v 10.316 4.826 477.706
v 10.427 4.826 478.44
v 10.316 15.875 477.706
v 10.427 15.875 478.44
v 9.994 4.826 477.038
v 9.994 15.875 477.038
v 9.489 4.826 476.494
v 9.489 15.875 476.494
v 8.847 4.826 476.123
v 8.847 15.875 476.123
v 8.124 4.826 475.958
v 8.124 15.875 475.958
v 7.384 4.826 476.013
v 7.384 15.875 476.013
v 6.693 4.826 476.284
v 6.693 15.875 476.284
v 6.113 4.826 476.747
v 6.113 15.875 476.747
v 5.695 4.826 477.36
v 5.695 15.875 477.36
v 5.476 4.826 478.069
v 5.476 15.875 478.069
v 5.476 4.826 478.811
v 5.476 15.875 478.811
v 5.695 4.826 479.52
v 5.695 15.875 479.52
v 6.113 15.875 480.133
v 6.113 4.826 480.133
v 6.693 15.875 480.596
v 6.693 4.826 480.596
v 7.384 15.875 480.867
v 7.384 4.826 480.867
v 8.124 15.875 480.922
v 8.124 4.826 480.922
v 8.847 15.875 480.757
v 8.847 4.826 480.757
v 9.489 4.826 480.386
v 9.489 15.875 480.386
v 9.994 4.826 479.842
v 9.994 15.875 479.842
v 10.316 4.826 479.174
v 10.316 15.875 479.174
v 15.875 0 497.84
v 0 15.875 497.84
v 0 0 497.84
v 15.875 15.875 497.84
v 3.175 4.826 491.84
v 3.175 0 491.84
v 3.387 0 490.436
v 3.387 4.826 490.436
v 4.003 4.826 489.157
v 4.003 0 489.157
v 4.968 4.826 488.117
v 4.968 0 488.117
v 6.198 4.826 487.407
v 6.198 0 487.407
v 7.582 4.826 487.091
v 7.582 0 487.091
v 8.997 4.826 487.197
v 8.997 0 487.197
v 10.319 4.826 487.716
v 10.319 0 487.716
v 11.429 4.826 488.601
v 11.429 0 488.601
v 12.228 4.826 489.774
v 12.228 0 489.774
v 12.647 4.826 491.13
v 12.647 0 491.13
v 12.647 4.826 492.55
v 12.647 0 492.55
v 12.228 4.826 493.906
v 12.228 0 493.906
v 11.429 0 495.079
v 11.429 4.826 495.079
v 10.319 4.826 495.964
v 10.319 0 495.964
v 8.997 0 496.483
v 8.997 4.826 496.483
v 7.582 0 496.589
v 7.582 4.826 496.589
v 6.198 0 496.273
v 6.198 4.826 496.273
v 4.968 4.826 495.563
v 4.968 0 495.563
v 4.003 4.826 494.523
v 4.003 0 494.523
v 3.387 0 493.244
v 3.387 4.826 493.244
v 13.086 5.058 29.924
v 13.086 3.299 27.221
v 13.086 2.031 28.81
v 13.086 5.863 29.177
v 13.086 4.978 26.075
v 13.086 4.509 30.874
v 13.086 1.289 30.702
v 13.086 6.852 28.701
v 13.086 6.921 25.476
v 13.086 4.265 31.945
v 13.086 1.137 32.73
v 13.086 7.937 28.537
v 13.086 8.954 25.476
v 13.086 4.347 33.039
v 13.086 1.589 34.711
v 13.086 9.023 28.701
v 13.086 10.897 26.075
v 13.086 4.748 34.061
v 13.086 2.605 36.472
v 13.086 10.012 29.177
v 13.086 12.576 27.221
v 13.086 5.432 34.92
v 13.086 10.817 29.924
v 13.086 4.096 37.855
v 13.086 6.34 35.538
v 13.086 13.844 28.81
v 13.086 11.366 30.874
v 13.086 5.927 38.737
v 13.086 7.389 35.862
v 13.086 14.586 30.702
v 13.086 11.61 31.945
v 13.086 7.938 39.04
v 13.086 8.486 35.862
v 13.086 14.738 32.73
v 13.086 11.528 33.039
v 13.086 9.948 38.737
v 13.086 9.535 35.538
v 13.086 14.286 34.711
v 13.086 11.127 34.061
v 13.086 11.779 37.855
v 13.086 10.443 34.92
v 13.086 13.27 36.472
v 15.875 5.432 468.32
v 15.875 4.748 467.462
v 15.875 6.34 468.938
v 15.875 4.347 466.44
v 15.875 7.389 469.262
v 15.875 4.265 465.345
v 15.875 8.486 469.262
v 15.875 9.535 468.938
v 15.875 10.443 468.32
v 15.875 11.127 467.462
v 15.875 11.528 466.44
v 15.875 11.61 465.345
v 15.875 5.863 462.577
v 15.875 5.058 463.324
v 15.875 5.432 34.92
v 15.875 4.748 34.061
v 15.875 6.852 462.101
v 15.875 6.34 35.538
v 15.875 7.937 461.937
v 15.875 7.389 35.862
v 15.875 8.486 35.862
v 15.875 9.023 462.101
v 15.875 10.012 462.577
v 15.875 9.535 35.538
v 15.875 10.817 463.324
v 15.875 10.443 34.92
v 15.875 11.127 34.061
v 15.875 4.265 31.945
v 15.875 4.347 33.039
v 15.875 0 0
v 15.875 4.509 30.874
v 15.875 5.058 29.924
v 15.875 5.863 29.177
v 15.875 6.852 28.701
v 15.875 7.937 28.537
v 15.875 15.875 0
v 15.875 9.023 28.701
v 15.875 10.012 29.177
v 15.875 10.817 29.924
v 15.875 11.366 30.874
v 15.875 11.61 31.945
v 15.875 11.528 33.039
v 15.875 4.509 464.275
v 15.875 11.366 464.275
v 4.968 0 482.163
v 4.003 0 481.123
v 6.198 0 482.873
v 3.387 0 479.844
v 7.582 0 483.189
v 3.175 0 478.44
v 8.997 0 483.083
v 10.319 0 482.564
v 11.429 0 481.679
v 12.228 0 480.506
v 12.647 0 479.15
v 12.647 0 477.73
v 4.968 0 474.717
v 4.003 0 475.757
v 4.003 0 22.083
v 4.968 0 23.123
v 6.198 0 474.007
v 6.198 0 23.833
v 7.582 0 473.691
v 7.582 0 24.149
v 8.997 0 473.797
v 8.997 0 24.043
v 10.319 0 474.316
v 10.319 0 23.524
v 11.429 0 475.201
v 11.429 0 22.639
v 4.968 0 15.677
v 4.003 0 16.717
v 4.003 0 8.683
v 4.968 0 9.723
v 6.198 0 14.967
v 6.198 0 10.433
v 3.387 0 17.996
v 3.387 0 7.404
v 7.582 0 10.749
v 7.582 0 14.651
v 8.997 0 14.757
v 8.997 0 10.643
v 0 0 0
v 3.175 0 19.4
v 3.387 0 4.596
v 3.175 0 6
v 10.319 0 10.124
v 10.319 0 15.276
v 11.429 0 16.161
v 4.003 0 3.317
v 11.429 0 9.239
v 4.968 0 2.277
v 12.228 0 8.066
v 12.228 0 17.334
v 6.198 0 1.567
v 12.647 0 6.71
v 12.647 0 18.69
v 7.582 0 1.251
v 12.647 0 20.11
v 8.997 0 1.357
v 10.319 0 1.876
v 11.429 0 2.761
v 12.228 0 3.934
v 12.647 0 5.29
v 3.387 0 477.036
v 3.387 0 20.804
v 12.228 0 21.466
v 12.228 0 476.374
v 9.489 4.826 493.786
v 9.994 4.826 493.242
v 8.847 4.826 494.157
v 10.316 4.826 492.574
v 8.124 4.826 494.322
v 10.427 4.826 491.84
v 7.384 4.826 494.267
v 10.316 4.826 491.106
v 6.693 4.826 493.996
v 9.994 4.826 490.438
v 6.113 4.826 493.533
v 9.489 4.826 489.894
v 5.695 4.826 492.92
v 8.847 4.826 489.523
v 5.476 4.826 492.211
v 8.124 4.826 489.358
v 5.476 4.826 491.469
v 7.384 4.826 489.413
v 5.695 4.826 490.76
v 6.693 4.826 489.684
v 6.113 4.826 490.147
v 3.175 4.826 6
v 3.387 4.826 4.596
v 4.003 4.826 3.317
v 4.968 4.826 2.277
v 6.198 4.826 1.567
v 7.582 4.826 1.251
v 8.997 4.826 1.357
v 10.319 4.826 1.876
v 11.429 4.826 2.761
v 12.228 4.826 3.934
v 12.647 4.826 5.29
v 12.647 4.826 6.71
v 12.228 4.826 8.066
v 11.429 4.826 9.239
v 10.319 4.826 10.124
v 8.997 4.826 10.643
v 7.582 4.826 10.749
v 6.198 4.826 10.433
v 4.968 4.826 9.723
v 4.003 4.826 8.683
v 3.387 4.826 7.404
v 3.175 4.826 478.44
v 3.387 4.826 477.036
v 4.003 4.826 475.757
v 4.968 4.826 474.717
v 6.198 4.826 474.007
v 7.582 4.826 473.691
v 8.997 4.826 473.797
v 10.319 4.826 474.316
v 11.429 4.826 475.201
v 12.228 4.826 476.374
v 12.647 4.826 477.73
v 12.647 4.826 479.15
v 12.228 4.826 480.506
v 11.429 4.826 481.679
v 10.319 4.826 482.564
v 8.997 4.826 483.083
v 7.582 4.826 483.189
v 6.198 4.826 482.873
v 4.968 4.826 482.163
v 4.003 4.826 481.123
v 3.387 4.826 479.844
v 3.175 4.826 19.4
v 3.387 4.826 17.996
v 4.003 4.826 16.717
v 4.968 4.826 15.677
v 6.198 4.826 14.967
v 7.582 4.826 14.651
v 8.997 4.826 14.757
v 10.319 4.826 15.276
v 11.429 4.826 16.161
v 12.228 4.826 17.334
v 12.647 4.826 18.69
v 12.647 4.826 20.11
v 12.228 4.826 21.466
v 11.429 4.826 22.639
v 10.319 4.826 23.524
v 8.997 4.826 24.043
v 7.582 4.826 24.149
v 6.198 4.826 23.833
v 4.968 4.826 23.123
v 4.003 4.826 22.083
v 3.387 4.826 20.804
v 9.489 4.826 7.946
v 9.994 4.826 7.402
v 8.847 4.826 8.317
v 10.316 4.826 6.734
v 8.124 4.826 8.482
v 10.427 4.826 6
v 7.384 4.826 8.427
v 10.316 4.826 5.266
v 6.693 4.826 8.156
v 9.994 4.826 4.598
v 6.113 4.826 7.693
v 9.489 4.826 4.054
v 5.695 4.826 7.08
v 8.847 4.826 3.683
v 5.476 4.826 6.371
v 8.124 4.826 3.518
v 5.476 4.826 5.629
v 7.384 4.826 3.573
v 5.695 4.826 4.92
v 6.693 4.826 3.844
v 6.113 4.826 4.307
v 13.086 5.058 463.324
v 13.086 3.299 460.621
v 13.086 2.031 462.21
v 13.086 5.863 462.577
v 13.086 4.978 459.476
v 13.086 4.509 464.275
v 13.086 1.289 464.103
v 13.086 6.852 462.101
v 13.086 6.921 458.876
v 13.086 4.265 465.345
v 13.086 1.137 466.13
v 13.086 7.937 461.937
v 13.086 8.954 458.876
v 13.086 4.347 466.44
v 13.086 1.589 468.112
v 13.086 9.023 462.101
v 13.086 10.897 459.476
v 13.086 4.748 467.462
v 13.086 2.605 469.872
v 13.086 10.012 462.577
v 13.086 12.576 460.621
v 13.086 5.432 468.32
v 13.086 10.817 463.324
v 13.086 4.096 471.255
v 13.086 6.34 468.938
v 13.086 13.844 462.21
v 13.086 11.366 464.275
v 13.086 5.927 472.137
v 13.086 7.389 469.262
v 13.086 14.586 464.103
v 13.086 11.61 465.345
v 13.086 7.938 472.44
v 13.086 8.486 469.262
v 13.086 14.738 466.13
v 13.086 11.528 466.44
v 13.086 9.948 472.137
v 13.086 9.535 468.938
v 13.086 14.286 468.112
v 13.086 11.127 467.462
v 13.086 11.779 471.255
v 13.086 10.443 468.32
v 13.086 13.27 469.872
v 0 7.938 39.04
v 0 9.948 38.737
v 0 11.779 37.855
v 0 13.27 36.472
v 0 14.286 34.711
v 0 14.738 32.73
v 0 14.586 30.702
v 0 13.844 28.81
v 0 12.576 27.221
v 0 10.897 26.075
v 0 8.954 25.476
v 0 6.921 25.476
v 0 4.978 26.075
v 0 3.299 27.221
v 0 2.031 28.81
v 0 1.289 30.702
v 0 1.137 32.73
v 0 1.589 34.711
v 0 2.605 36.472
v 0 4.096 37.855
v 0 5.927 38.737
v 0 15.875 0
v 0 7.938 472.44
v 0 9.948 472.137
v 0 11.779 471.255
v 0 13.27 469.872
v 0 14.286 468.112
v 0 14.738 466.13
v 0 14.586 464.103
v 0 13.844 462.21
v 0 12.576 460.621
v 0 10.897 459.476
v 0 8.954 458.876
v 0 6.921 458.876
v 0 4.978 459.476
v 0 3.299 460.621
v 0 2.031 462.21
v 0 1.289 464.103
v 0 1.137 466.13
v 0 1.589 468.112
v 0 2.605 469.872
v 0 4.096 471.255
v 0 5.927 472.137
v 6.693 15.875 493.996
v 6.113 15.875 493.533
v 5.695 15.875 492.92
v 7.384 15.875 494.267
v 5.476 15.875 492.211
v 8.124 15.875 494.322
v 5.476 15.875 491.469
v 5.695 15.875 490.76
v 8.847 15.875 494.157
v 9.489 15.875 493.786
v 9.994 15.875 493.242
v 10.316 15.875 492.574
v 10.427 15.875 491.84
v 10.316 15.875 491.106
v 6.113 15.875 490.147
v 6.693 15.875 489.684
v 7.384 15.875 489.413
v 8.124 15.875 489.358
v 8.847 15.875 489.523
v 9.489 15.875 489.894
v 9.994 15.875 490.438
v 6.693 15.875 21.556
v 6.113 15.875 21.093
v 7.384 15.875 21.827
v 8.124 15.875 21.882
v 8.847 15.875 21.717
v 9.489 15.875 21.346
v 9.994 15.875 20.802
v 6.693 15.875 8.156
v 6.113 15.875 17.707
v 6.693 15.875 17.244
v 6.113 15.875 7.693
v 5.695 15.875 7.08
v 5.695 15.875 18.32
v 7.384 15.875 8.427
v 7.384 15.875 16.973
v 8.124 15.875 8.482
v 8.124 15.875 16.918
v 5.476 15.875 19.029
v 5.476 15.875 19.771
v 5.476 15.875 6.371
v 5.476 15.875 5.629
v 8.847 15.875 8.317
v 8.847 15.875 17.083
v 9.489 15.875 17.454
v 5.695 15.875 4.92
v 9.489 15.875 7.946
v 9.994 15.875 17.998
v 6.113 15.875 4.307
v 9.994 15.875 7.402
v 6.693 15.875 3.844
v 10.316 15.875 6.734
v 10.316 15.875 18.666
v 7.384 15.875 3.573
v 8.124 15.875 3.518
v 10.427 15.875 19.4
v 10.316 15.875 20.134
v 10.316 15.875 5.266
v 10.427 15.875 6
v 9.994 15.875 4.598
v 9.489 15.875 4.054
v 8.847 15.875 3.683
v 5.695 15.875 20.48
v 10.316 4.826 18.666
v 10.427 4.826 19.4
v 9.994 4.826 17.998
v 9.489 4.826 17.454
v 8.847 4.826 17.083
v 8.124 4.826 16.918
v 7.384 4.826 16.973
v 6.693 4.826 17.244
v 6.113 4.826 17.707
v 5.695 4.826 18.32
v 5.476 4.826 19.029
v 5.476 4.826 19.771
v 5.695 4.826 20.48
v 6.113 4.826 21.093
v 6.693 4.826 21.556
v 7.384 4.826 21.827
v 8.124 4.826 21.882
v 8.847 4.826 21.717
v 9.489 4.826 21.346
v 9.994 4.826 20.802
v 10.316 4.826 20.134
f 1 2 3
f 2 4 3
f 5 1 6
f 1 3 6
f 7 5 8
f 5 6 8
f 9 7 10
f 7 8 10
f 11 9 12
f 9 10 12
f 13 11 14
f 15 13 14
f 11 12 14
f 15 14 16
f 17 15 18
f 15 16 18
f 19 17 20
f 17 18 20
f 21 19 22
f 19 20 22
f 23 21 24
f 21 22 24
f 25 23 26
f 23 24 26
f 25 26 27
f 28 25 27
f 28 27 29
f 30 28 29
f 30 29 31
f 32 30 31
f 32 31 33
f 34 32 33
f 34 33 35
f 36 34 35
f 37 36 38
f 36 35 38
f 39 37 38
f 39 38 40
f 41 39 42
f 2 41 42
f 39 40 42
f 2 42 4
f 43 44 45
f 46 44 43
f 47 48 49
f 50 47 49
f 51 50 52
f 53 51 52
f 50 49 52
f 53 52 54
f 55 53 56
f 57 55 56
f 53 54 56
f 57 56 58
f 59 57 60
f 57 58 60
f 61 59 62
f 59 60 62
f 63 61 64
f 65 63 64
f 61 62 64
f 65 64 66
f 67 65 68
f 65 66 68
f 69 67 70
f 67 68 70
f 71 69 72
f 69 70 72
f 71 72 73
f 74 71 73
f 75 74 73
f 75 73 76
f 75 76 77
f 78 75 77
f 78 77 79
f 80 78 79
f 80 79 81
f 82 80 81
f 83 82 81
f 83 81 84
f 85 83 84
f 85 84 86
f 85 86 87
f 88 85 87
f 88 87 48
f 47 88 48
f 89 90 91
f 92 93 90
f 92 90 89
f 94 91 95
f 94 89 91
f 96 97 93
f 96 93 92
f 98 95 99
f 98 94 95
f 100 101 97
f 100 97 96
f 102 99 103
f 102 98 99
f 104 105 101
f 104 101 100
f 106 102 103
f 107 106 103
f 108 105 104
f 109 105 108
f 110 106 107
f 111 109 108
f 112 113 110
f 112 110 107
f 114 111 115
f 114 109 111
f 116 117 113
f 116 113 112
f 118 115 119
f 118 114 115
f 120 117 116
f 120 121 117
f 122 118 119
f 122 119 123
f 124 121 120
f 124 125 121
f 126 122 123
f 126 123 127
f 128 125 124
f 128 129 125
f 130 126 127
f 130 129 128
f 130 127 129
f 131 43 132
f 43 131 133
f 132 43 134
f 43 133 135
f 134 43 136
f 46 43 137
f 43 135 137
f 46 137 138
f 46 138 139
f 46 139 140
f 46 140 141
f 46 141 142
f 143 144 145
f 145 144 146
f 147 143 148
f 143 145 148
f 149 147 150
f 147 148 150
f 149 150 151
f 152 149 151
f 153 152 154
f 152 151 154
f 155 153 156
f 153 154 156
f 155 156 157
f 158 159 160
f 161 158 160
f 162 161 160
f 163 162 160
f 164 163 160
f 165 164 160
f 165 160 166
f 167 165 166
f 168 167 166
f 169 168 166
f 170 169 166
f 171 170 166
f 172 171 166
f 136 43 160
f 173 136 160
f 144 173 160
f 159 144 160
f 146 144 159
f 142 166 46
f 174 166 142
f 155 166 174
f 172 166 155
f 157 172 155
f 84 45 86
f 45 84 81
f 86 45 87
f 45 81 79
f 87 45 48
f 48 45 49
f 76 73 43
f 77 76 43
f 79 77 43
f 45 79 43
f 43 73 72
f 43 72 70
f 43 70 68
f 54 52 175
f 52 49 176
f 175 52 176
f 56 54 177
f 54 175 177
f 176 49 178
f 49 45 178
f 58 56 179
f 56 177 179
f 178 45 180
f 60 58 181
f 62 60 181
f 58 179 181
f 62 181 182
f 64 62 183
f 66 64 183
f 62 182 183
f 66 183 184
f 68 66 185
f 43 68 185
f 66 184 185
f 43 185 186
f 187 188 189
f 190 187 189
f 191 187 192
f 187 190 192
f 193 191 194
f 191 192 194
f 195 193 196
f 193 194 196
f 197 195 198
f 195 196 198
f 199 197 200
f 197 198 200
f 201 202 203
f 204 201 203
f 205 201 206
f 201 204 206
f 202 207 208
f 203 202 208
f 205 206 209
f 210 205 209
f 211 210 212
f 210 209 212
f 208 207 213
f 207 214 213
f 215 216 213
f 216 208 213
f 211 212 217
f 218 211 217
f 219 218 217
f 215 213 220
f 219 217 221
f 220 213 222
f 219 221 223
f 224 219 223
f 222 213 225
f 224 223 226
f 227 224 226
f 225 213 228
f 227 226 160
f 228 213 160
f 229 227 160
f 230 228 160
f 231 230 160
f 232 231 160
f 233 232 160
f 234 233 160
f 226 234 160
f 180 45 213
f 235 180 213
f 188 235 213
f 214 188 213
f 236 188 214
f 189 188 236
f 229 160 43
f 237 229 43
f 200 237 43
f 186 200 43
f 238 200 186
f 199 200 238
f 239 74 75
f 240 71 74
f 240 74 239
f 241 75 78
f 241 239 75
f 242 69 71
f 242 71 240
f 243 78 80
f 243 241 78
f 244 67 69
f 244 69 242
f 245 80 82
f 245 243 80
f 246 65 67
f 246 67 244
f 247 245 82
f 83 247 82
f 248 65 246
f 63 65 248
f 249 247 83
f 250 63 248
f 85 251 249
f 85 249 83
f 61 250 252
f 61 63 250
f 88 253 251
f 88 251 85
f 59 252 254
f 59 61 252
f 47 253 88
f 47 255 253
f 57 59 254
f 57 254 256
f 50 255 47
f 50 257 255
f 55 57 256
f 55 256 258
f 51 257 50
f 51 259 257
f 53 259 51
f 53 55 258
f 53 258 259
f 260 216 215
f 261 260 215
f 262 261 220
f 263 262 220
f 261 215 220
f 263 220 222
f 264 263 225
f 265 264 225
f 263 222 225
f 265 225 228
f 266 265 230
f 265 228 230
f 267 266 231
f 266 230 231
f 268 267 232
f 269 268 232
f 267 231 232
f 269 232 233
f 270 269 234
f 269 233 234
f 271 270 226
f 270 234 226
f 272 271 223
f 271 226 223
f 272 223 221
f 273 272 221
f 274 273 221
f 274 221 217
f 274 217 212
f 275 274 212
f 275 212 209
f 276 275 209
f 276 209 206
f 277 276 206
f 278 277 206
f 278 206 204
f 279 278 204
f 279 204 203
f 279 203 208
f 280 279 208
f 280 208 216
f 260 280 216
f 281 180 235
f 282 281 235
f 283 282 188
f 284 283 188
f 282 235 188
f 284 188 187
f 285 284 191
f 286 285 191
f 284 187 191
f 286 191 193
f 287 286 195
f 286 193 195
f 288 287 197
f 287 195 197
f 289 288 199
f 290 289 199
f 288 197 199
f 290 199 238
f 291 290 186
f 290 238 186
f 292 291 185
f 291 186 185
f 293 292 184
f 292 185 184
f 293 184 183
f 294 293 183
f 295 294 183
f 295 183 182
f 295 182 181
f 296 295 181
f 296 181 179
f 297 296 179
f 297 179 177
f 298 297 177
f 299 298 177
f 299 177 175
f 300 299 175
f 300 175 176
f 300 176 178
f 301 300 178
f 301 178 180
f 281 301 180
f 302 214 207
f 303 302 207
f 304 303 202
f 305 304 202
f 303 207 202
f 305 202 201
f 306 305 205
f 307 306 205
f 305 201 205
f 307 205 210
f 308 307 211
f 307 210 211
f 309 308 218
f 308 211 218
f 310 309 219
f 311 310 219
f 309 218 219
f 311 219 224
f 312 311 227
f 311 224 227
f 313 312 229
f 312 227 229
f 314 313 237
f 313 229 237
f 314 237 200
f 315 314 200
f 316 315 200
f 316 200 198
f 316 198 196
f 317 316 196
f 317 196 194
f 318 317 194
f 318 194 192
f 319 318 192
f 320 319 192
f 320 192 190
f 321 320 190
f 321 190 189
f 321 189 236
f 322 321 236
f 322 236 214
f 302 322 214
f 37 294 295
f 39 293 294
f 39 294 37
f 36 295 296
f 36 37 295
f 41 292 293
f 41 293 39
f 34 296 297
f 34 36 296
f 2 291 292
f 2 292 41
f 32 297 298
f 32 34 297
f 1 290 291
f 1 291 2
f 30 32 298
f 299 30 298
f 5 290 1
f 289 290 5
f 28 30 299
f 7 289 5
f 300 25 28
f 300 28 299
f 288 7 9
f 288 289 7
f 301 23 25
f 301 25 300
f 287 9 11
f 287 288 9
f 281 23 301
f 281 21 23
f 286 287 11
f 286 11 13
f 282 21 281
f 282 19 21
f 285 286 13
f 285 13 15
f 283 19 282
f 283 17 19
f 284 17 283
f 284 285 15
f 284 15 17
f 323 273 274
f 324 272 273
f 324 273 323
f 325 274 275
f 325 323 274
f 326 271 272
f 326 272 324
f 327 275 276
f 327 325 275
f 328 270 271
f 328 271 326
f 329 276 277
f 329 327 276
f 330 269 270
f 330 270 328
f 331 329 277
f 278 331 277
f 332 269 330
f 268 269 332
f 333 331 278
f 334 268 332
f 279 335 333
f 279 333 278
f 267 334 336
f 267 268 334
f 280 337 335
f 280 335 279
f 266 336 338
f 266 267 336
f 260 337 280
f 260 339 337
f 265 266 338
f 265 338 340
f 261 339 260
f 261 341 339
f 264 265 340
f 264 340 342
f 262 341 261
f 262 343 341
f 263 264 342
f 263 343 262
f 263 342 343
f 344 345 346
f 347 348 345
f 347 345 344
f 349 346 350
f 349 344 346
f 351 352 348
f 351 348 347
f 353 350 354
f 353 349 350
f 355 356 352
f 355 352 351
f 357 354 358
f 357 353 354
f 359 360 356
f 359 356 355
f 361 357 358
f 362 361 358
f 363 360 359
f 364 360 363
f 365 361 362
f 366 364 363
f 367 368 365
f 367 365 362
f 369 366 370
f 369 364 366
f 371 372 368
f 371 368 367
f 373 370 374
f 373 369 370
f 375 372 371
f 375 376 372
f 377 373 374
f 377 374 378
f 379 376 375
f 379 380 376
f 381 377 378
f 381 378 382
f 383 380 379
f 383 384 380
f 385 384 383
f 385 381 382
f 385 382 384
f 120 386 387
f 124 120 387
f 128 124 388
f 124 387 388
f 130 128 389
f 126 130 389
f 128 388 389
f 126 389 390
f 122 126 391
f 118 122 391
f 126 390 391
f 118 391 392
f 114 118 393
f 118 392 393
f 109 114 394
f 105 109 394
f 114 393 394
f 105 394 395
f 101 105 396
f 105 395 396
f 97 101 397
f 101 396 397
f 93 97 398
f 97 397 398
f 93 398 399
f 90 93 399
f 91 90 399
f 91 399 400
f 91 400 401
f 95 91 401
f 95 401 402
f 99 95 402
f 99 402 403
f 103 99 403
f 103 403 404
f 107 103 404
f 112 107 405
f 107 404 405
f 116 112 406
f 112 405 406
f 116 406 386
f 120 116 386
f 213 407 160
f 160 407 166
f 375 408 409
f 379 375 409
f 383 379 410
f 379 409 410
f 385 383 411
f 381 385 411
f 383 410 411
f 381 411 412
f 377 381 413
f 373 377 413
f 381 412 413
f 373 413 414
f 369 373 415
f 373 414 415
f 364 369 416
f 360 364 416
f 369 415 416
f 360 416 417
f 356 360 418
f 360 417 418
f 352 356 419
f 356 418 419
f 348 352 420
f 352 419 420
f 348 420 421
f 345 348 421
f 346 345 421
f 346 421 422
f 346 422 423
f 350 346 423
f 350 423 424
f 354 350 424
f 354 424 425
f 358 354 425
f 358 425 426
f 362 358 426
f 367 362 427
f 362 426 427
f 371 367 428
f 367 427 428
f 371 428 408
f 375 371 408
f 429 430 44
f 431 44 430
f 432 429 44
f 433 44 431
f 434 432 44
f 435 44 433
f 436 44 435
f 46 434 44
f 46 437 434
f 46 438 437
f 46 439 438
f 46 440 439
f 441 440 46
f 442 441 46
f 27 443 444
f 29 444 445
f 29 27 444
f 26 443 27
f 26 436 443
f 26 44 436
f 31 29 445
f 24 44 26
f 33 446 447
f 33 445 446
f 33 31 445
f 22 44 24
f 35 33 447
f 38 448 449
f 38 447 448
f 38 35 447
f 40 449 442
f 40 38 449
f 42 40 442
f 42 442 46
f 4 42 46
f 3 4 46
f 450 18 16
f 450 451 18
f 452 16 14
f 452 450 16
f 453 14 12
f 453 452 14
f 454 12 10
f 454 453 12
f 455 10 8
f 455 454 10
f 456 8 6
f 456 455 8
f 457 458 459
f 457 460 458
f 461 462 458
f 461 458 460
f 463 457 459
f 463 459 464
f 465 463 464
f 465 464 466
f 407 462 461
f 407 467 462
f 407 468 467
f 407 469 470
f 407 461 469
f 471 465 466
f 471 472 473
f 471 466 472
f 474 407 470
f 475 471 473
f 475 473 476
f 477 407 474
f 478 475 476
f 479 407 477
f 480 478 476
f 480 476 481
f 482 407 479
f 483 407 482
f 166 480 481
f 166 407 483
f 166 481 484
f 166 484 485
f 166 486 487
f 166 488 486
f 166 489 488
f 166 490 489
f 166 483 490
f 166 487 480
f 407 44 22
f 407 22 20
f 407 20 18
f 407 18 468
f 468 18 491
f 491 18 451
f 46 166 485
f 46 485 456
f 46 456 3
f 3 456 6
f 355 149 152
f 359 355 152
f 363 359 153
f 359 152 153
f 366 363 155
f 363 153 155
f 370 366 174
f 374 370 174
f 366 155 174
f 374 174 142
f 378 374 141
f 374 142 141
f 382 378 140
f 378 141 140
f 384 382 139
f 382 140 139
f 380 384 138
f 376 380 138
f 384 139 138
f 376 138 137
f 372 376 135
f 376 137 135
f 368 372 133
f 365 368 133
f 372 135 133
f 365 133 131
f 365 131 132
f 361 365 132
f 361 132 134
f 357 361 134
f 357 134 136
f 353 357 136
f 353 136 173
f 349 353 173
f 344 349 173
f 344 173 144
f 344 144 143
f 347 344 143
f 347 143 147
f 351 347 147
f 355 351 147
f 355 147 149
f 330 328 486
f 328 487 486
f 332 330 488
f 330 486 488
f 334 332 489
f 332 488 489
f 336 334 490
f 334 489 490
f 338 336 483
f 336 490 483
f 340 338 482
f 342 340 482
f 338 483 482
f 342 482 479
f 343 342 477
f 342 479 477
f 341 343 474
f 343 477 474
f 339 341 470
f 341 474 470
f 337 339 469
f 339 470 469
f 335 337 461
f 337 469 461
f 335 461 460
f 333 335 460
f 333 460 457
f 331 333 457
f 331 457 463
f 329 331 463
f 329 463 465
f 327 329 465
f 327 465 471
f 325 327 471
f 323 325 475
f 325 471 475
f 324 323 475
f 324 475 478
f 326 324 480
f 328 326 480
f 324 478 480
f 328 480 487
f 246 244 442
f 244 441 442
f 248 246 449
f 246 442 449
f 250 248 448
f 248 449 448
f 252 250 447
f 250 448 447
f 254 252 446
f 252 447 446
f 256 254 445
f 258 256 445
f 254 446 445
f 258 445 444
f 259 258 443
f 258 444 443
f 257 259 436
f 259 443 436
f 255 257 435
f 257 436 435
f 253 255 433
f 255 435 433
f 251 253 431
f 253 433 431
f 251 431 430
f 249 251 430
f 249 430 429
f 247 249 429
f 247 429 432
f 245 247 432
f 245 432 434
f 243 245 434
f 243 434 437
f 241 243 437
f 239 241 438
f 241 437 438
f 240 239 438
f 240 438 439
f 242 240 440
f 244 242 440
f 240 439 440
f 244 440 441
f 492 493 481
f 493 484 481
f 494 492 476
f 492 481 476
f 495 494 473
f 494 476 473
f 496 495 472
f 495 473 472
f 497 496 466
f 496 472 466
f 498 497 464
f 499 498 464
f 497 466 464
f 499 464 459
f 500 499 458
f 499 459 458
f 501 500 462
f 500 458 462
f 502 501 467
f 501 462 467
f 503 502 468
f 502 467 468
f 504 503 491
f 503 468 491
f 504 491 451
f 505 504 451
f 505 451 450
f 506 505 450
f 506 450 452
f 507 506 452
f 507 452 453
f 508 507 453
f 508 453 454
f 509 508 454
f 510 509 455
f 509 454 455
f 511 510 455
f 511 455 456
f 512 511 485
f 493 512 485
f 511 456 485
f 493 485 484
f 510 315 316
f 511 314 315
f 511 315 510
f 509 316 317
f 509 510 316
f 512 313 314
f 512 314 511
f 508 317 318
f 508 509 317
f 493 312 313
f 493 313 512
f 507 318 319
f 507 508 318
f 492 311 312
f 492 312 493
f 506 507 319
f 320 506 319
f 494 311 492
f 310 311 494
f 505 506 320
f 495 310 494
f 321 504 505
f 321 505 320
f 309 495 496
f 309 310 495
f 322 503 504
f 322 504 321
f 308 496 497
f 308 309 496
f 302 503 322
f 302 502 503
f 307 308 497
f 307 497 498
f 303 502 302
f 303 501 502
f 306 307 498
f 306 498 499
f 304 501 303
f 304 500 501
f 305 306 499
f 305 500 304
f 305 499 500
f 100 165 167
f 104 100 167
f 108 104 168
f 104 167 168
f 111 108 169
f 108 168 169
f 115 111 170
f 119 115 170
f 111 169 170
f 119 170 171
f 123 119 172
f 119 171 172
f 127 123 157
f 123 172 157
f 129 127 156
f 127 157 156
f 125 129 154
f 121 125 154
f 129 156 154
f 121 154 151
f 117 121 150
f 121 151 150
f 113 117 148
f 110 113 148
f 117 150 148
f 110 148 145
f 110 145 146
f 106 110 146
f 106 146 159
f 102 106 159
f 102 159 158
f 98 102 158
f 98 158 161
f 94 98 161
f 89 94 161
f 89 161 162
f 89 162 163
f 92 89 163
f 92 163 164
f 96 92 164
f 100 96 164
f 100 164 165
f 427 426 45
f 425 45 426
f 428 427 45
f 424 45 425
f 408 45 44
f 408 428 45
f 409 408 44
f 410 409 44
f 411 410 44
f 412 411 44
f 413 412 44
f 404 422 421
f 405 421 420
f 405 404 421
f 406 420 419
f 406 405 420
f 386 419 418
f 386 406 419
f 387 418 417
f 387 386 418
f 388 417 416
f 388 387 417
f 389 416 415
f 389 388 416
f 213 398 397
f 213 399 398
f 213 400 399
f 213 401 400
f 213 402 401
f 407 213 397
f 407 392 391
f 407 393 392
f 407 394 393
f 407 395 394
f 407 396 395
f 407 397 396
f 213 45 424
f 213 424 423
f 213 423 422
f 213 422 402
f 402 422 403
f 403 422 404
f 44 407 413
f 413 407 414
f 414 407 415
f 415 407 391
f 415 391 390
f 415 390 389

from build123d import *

# Parameters (mm, degrees)
SKETCH1_W                                       = 15.875
SKETCH1_H                                       = 15.875
BOSS_EXTRUDE1_DEPTH                             = 497.84
SKETCH8_R                                       = 6.8199
CUT_EXTRUDE1_DEPTH                              = 13.08608
L_0_29_DIAMETER_HOLE1_D                         = 7.366
L_0_29_DIAMETER_HOLE1_DEPTH                     = 50.8
L_0_29_DIAMETER_HOLE1_TIP                       = 2.21296966
CBORE_FOR_10_SOCKET_HEAD_CAP_SCREW1_D           = 4.9784
CBORE_FOR_10_SOCKET_HEAD_CAP_SCREW1_DEPTH       = 25.4
CBORE_FOR_10_SOCKET_HEAD_CAP_SCREW1_CBORE_D     = 9.525
CBORE_FOR_10_SOCKET_HEAD_CAP_SCREW1_CBORE_DEPTH = 4.826
CBORE_FOR_10_SOCKET_HEAD_CAP_SCREW1_TIP         = 1.495662253
CBORE_FOR_10_SOCKET_HEAD_CAP_SCREW2_D           = 4.9784
CBORE_FOR_10_SOCKET_HEAD_CAP_SCREW2_DEPTH       = 25.4
CBORE_FOR_10_SOCKET_HEAD_CAP_SCREW2_CBORE_D     = 9.525
CBORE_FOR_10_SOCKET_HEAD_CAP_SCREW2_CBORE_DEPTH = 4.826
CBORE_FOR_10_SOCKET_HEAD_CAP_SCREW2_TIP         = 1.495662253


with BuildPart() as part:
    # Sketch1 → Boss-Extrude1 (new body)
    with BuildSketch(Plane.XY):
        with Locations((7.9375, 7.9375)):
            Rectangle(SKETCH1_W, SKETCH1_H)
    extrude(amount=BOSS_EXTRUDE1_DEPTH)

    # Sketch8 → Cut-Extrude1 (cut)
    with BuildSketch(Plane.ZY):
        with Locations((465.6201, 7.9375)):
            Circle(SKETCH8_R)
        with Locations((32.2199, 7.9375)):
            Circle(SKETCH8_R)
    extrude(amount=-CUT_EXTRUDE1_DEPTH, mode=Mode.SUBTRACT)

    # L (0.29) Diameter Hole1
    with Locations(Plane.ZY.offset(-13.08608)):
        with Locations((32.2199, 7.9375), (465.6201, 7.9375)):
            Hole(L_0_29_DIAMETER_HOLE1_D / 2, depth=L_0_29_DIAMETER_HOLE1_DEPTH)
            with Locations((0, 0, -(L_0_29_DIAMETER_HOLE1_DEPTH + L_0_29_DIAMETER_HOLE1_TIP / 2))):  # 118° drill point
                Cone(0, L_0_29_DIAMETER_HOLE1_D / 2, L_0_29_DIAMETER_HOLE1_TIP, mode=Mode.SUBTRACT)

    # CBORE for #10 Socket Head Cap Screw1
    with Locations(Plane(origin=(-863.724136144, 0, -1707.973131805), x_dir=(-1, 0, 0), z_dir=(0, -1, 0))):
        with Locations((-404.936636144, -2199.813131805), (-404.936636144, -2186.413131805), (-871.661636144, -2186.413131805), (-871.661636144, -2199.813131805)):
            CounterBoreHole(CBORE_FOR_10_SOCKET_HEAD_CAP_SCREW1_D / 2, CBORE_FOR_10_SOCKET_HEAD_CAP_SCREW1_CBORE_D / 2, CBORE_FOR_10_SOCKET_HEAD_CAP_SCREW1_CBORE_DEPTH, depth=CBORE_FOR_10_SOCKET_HEAD_CAP_SCREW1_DEPTH)
            with Locations((0, 0, -(CBORE_FOR_10_SOCKET_HEAD_CAP_SCREW1_DEPTH + CBORE_FOR_10_SOCKET_HEAD_CAP_SCREW1_TIP / 2))):  # 118° drill point
                Cone(0, CBORE_FOR_10_SOCKET_HEAD_CAP_SCREW1_D / 2, CBORE_FOR_10_SOCKET_HEAD_CAP_SCREW1_TIP, mode=Mode.SUBTRACT)

    # CBORE for #10 Socket Head Cap Screw2
    with Locations(Plane(origin=(-863.724136144, 0, -1707.973131805), x_dir=(-1, 0, 0), z_dir=(0, -1, 0))):
        with Locations((-404.936636144, -1713.973131805), (-404.936636144, -1727.373131805), (-871.661636144, -1713.973131805), (-871.661636144, -1727.373131805)):
            CounterBoreHole(CBORE_FOR_10_SOCKET_HEAD_CAP_SCREW2_D / 2, CBORE_FOR_10_SOCKET_HEAD_CAP_SCREW2_CBORE_D / 2, CBORE_FOR_10_SOCKET_HEAD_CAP_SCREW2_CBORE_DEPTH, depth=CBORE_FOR_10_SOCKET_HEAD_CAP_SCREW2_DEPTH)
            with Locations((0, 0, -(CBORE_FOR_10_SOCKET_HEAD_CAP_SCREW2_DEPTH + CBORE_FOR_10_SOCKET_HEAD_CAP_SCREW2_TIP / 2))):  # 118° drill point
                Cone(0, CBORE_FOR_10_SOCKET_HEAD_CAP_SCREW2_D / 2, CBORE_FOR_10_SOCKET_HEAD_CAP_SCREW2_TIP, mode=Mode.SUBTRACT)


solid = part.part
